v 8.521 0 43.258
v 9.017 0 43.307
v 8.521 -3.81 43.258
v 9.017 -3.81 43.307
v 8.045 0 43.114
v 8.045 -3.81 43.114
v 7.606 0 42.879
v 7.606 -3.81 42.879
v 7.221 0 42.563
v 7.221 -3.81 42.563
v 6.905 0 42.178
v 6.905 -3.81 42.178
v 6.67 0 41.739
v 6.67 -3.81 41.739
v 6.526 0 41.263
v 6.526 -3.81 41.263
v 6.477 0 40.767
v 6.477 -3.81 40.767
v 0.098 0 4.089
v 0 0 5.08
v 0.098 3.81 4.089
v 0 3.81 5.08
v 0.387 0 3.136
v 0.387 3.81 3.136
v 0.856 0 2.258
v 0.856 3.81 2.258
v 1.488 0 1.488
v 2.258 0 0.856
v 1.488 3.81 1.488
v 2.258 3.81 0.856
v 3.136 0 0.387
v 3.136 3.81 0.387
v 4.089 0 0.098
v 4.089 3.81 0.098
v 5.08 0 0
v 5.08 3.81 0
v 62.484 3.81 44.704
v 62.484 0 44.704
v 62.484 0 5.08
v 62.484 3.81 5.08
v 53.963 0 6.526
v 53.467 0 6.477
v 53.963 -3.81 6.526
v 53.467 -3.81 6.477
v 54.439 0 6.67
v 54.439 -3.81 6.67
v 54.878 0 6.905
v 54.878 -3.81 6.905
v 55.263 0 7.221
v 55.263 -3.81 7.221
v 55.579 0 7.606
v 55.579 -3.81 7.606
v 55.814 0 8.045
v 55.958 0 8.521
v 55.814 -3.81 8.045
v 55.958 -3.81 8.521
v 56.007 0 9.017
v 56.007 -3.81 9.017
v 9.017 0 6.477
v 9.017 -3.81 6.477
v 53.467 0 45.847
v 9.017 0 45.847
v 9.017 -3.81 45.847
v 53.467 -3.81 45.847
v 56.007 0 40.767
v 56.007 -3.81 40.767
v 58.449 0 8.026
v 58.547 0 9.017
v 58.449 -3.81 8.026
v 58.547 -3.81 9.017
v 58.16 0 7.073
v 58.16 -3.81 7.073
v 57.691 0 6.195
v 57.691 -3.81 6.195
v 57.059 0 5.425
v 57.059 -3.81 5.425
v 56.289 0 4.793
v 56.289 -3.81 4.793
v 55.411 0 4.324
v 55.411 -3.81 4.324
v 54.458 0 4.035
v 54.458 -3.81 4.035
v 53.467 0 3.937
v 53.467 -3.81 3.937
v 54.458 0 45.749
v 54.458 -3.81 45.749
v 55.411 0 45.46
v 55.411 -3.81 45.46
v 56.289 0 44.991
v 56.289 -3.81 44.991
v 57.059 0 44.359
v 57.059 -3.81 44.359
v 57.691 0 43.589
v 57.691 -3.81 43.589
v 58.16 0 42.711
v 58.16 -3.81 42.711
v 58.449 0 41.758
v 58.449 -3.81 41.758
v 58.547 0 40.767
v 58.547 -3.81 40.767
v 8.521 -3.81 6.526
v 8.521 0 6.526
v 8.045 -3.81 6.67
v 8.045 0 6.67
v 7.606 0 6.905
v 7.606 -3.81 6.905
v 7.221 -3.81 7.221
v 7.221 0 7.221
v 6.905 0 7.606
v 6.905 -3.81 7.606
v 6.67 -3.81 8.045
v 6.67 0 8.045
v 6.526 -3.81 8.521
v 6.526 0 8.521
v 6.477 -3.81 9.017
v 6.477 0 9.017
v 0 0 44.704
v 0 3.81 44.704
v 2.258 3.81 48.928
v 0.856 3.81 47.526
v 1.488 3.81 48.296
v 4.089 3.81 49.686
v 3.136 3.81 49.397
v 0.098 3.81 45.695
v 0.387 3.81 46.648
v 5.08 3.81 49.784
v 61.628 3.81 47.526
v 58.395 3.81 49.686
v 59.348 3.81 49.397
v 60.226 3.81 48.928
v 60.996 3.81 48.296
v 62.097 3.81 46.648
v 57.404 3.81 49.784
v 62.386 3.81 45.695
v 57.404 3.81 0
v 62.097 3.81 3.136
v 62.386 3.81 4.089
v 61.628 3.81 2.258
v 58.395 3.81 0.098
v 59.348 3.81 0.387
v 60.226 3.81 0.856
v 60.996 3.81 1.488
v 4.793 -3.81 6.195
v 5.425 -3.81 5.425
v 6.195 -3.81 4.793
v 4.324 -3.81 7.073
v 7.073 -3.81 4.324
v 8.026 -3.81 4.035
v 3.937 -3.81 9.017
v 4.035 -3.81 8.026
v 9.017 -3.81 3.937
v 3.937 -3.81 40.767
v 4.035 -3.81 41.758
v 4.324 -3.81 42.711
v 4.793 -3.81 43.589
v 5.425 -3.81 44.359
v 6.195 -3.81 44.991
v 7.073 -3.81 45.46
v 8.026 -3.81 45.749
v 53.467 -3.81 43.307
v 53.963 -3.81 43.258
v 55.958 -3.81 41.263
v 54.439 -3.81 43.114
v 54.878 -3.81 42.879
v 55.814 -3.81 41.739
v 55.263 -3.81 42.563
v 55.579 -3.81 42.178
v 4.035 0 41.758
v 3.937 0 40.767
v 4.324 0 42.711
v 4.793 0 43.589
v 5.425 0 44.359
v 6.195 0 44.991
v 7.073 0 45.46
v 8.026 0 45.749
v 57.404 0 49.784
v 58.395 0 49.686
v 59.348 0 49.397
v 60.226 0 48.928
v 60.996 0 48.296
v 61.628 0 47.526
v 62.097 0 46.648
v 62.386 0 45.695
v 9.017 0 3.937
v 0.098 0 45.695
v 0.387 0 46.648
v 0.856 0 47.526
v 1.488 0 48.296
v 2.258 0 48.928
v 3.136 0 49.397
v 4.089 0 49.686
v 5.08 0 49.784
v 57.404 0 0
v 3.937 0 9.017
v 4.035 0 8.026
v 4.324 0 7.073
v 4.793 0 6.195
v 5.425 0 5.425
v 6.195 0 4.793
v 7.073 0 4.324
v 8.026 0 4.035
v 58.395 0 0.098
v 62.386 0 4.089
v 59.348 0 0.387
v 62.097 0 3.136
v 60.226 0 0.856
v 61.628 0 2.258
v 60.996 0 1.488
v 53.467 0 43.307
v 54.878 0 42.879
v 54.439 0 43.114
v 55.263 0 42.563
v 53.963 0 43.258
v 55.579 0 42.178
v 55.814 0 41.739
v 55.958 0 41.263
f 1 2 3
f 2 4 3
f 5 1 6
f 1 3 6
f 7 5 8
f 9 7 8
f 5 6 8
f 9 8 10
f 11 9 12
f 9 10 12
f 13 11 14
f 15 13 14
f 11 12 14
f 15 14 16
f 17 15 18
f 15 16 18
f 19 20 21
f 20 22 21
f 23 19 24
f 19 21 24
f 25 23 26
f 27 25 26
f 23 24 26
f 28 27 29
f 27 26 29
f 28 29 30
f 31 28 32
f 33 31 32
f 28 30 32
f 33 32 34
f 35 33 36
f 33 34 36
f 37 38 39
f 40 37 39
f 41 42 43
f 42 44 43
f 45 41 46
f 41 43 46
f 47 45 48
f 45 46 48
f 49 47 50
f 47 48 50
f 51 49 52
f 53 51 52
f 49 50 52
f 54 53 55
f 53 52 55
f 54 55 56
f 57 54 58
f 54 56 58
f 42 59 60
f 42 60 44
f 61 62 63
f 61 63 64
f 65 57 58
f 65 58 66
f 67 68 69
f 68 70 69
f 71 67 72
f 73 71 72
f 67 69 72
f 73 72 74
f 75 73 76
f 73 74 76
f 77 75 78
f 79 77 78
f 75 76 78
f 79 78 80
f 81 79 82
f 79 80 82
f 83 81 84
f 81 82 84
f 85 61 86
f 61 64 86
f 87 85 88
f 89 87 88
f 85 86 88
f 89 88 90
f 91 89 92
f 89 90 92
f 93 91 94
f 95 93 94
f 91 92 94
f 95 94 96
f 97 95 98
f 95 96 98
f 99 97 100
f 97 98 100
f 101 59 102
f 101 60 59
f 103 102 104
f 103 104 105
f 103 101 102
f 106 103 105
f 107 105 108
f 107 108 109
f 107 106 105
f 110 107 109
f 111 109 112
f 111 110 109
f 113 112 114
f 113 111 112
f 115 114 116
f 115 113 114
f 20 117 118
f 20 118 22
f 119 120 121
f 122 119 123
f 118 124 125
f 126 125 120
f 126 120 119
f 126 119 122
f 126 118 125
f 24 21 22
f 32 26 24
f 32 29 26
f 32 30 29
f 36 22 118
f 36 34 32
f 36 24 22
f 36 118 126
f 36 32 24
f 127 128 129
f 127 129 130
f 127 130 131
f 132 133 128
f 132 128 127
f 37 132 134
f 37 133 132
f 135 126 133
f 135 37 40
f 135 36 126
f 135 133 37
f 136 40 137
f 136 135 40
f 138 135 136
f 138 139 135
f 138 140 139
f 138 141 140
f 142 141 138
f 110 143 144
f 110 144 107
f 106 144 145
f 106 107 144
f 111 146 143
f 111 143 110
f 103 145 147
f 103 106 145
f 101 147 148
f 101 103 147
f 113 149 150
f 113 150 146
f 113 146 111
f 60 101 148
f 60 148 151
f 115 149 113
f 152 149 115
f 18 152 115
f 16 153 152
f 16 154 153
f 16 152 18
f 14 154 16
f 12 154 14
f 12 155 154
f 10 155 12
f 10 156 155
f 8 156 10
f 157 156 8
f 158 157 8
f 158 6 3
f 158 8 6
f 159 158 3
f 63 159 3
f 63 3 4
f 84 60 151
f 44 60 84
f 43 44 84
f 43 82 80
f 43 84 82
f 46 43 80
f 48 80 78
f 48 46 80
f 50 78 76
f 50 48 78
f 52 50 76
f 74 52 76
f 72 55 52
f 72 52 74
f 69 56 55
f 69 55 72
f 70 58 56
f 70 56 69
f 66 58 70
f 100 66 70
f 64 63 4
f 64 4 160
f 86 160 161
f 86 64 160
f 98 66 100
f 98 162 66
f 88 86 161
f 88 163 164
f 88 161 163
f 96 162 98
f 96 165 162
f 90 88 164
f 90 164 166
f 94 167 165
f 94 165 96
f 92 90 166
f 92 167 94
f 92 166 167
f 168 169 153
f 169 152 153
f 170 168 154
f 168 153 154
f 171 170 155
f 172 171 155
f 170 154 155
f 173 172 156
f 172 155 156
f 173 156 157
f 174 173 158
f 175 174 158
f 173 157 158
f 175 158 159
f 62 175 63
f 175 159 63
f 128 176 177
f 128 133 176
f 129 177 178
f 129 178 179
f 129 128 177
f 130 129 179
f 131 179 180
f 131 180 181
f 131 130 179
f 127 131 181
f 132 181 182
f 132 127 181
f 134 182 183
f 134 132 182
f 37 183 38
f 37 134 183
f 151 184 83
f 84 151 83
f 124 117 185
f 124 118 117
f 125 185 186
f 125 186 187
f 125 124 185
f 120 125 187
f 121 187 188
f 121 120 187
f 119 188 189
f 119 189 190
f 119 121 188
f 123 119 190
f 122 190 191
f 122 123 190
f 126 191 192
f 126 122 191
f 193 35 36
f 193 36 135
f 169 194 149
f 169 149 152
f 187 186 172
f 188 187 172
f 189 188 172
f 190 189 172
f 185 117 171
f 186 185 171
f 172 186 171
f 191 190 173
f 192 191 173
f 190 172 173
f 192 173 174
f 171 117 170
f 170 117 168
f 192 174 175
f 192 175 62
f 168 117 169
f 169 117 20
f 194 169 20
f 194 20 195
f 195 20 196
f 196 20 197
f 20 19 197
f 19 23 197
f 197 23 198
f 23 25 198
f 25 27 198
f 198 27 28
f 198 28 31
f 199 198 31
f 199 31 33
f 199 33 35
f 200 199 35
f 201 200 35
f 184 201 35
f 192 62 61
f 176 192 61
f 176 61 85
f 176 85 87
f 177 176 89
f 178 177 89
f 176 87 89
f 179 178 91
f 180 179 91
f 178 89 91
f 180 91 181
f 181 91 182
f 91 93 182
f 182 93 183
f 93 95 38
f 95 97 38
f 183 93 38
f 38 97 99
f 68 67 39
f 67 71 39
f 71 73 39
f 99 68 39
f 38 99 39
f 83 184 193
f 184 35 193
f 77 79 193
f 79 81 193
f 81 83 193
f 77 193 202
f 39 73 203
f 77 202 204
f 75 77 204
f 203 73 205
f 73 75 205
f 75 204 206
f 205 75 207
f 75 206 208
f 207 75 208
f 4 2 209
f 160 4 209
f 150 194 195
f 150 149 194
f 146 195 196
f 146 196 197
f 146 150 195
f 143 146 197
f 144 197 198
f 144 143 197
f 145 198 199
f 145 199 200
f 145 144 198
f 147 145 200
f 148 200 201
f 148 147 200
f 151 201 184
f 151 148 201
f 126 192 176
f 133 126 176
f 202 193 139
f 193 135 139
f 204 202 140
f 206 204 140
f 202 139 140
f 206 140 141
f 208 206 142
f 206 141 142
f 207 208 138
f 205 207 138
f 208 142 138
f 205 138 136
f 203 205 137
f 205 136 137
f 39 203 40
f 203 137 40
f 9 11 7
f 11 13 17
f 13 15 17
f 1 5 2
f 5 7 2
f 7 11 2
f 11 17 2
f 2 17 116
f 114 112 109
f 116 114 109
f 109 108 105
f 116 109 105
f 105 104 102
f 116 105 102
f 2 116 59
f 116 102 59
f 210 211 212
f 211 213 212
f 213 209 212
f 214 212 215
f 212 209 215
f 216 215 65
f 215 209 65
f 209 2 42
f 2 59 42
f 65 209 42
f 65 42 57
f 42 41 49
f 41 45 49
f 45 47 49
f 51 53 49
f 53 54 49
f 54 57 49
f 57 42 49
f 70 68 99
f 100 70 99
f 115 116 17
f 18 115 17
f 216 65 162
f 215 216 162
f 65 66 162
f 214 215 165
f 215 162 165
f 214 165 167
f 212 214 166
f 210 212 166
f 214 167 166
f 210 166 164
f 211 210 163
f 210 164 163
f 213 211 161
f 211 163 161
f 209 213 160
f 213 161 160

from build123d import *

# Parameters (mm, degrees)
SKETCH1_W           = 62.484
SKETCH1_H           = 49.784
BOSS_EXTRUDE1_DEPTH = 3.81
SKETCH2_W           = 54.61
SKETCH2_H           = 41.91
SKETCH2_W_2         = 49.53
SKETCH2_H_2         = 36.83
BOSS_EXTRUDE3_DEPTH = 3.81
FILLET1_R           = 5.08
FILLET2_R           = 5.08
FILLET3_R           = 2.54


with BuildPart() as part:
    # Sketch1 → Boss-Extrude1 (new body)
    with BuildSketch(Plane(origin=(0, 0, 0), x_dir=(1, 0, 0), z_dir=(0, 1, 0))):
        with Locations((31.242, -24.892)):
            Rectangle(SKETCH1_W, SKETCH1_H)
    extrude(amount=BOSS_EXTRUDE1_DEPTH)

    # Sketch2 → Boss-Extrude3 (add)
    with BuildSketch(Plane.XZ):
        with Locations((31.242, 24.892)):
            Rectangle(SKETCH2_W, SKETCH2_H)
        with Locations((31.242, 24.892)):
            Rectangle(SKETCH2_W_2, SKETCH2_H_2, mode=Mode.SUBTRACT)
    extrude(amount=BOSS_EXTRUDE3_DEPTH)

    # Fillet1
    fillet1_edges = [part.edges().sort_by_distance(p)[0] for p in [
        (0, 1.905, 49.784),
        (0, 1.905, 0),
        (62.484, 1.905, 0),
        (62.484, 1.905, 49.784),
    ]]
    fillet(fillet1_edges, radius=FILLET1_R)

    # Fillet2
    fillet2_edges = [part.edges().sort_by_distance(p)[0] for p in [
        (58.547, -1.905, 3.937),
        (58.547, -1.905, 45.847),
        (3.937, -1.905, 45.847),
        (3.937, -1.905, 3.937),
    ]]
    fillet(fillet2_edges, radius=FILLET2_R)

    # Fillet3
    fillet3_edges = [part.edges().sort_by_distance(p)[0] for p in [
        (56.007, -1.905, 43.307),
        (6.477, -1.905, 43.307),
        (6.477, -1.905, 6.477),
        (56.007, -1.905, 6.477),
    ]]
    fillet(fillet3_edges, radius=FILLET3_R)


solid = part.part
